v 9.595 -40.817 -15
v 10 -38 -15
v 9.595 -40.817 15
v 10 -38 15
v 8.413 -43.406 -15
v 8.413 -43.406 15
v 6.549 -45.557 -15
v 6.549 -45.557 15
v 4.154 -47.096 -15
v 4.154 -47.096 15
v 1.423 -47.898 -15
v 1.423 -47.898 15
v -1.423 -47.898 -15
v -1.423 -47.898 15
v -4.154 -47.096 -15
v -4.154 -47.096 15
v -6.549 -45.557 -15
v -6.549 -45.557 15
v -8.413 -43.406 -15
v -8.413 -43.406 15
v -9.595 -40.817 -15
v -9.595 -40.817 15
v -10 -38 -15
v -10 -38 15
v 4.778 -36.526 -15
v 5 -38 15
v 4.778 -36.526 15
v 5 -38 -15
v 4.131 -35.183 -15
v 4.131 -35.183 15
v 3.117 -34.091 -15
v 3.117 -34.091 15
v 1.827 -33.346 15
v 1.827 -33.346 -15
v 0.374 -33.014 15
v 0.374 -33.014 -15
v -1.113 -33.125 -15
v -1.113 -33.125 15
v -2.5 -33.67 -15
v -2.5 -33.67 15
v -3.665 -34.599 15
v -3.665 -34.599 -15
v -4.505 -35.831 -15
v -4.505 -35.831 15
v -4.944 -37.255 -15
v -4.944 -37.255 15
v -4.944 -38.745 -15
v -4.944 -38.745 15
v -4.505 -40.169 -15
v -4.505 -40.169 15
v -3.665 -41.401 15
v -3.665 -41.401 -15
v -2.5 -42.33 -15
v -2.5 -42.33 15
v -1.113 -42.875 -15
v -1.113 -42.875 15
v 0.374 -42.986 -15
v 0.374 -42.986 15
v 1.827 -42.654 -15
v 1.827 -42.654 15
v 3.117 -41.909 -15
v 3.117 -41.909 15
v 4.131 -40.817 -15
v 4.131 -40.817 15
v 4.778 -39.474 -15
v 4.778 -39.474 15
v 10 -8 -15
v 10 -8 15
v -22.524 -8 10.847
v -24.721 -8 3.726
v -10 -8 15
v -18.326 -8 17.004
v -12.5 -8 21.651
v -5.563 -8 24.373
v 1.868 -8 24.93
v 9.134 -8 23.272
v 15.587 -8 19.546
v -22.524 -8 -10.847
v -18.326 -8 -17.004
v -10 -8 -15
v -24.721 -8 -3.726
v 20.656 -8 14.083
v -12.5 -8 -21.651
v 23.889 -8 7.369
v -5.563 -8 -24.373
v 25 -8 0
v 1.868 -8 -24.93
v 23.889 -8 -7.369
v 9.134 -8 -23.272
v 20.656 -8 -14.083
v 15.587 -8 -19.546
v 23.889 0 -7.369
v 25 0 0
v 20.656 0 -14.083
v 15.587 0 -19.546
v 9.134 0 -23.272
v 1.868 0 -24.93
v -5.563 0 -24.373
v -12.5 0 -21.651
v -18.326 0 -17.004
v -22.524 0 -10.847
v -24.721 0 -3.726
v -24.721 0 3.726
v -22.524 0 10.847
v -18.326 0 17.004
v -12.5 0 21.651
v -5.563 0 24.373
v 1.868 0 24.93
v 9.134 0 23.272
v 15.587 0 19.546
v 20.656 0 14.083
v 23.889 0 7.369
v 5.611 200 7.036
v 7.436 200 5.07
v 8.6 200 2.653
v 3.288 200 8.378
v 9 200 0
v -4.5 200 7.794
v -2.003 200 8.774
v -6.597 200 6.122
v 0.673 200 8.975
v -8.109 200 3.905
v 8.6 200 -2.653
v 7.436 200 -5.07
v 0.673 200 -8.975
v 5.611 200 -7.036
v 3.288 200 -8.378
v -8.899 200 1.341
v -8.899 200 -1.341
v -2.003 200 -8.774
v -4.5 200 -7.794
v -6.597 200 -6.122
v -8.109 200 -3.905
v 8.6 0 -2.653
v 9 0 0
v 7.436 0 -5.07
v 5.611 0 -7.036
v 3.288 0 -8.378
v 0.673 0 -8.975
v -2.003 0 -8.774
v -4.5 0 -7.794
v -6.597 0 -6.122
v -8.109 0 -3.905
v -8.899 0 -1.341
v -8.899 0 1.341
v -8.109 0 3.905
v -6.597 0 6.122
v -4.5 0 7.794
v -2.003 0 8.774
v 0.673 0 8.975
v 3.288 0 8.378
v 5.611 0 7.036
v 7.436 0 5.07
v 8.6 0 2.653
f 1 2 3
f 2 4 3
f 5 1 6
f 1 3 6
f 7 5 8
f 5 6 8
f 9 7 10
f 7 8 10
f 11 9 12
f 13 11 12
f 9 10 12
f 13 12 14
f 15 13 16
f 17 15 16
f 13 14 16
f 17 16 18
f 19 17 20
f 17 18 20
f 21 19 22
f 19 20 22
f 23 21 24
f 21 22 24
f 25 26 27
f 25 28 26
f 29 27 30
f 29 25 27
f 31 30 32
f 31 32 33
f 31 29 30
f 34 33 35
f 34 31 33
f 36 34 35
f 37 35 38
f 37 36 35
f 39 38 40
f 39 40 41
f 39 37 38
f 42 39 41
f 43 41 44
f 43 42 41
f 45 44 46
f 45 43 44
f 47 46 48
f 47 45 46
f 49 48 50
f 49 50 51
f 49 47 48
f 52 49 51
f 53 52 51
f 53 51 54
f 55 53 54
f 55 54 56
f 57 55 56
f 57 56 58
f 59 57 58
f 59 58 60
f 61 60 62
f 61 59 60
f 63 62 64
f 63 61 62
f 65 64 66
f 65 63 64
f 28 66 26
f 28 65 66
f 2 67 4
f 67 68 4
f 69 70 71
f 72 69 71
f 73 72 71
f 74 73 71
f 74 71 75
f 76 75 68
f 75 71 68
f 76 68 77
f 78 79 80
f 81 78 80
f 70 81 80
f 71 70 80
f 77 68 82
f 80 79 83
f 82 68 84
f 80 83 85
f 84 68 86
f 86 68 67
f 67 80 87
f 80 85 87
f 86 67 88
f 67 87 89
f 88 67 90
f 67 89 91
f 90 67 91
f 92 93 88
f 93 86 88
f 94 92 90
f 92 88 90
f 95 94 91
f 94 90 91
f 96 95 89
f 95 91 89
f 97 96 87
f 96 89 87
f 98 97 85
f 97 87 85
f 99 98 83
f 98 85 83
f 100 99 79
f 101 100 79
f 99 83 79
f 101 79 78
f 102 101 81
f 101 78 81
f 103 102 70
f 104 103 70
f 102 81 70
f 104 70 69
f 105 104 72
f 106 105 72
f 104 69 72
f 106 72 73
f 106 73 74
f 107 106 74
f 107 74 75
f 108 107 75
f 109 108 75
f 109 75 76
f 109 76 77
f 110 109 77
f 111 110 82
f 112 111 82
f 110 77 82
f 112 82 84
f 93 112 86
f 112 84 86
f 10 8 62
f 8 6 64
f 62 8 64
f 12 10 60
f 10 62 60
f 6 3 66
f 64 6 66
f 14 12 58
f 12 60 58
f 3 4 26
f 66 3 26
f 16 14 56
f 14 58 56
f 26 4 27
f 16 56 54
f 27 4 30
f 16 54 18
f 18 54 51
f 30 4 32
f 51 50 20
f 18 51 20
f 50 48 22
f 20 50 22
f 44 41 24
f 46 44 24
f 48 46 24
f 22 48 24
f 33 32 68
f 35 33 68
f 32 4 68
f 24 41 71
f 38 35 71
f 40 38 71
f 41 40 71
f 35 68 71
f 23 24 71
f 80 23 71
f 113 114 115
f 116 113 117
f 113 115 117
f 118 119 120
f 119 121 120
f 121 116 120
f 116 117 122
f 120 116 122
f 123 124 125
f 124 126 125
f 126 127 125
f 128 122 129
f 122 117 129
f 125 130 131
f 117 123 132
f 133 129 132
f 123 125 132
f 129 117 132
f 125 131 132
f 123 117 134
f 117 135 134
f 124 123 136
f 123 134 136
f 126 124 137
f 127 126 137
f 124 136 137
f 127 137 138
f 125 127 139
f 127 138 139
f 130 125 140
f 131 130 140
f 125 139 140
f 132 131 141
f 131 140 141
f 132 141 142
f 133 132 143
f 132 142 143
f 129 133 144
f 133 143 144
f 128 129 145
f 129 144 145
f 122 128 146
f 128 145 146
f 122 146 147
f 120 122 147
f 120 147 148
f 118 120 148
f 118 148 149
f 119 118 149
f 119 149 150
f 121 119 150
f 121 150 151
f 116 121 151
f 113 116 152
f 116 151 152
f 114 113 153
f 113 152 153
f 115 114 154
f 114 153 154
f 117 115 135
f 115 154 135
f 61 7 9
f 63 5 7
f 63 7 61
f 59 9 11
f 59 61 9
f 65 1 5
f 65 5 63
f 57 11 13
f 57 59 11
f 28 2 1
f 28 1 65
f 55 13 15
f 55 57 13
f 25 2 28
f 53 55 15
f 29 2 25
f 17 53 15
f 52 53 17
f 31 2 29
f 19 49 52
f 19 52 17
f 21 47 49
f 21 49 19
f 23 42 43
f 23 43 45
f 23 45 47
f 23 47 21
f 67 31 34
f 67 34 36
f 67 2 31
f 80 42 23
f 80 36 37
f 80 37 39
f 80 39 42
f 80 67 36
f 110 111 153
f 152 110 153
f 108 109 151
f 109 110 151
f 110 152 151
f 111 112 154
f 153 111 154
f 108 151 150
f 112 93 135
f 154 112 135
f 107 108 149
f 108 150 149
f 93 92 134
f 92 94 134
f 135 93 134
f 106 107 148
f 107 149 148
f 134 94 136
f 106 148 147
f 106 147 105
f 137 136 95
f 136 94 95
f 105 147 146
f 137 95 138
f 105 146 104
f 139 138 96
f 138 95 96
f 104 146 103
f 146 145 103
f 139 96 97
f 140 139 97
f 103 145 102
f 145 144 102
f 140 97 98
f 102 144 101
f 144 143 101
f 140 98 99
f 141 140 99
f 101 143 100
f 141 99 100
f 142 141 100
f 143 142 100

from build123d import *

# Parameters (mm, degrees)
ESBO_O3_R                = 5
RESSALTO_EXTRUS_O1_DEPTH = 15


with BuildPart() as part:
    # Esboço1 → Revolução1 (revolve)
    with BuildSketch(Plane.XY):
        Polygon((0, 200), (9, 200), (9, 0), (25, 0), (25, -8), (0, -8), (0, 0), align=None)
    revolve(axis=Axis((0, 0, 0), (0, 1, 0)))

    # Esboço3 → Ressalto-extrusão1 (add, symmetric)
    with BuildSketch(Plane.XY):
        with BuildLine():
            Line((-10, -8), (10, -8))
            Line((10, -8), (10, -38))
            ThreePointArc((10, -38), (0, -48), (-10, -38))
            Line((-10, -38), (-10, -8))
        make_face()
        with Locations((0, -38)):
            Circle(ESBO_O3_R, mode=Mode.SUBTRACT)
    extrude(amount=RESSALTO_EXTRUS_O1_DEPTH, both=True)


solid = part.part
